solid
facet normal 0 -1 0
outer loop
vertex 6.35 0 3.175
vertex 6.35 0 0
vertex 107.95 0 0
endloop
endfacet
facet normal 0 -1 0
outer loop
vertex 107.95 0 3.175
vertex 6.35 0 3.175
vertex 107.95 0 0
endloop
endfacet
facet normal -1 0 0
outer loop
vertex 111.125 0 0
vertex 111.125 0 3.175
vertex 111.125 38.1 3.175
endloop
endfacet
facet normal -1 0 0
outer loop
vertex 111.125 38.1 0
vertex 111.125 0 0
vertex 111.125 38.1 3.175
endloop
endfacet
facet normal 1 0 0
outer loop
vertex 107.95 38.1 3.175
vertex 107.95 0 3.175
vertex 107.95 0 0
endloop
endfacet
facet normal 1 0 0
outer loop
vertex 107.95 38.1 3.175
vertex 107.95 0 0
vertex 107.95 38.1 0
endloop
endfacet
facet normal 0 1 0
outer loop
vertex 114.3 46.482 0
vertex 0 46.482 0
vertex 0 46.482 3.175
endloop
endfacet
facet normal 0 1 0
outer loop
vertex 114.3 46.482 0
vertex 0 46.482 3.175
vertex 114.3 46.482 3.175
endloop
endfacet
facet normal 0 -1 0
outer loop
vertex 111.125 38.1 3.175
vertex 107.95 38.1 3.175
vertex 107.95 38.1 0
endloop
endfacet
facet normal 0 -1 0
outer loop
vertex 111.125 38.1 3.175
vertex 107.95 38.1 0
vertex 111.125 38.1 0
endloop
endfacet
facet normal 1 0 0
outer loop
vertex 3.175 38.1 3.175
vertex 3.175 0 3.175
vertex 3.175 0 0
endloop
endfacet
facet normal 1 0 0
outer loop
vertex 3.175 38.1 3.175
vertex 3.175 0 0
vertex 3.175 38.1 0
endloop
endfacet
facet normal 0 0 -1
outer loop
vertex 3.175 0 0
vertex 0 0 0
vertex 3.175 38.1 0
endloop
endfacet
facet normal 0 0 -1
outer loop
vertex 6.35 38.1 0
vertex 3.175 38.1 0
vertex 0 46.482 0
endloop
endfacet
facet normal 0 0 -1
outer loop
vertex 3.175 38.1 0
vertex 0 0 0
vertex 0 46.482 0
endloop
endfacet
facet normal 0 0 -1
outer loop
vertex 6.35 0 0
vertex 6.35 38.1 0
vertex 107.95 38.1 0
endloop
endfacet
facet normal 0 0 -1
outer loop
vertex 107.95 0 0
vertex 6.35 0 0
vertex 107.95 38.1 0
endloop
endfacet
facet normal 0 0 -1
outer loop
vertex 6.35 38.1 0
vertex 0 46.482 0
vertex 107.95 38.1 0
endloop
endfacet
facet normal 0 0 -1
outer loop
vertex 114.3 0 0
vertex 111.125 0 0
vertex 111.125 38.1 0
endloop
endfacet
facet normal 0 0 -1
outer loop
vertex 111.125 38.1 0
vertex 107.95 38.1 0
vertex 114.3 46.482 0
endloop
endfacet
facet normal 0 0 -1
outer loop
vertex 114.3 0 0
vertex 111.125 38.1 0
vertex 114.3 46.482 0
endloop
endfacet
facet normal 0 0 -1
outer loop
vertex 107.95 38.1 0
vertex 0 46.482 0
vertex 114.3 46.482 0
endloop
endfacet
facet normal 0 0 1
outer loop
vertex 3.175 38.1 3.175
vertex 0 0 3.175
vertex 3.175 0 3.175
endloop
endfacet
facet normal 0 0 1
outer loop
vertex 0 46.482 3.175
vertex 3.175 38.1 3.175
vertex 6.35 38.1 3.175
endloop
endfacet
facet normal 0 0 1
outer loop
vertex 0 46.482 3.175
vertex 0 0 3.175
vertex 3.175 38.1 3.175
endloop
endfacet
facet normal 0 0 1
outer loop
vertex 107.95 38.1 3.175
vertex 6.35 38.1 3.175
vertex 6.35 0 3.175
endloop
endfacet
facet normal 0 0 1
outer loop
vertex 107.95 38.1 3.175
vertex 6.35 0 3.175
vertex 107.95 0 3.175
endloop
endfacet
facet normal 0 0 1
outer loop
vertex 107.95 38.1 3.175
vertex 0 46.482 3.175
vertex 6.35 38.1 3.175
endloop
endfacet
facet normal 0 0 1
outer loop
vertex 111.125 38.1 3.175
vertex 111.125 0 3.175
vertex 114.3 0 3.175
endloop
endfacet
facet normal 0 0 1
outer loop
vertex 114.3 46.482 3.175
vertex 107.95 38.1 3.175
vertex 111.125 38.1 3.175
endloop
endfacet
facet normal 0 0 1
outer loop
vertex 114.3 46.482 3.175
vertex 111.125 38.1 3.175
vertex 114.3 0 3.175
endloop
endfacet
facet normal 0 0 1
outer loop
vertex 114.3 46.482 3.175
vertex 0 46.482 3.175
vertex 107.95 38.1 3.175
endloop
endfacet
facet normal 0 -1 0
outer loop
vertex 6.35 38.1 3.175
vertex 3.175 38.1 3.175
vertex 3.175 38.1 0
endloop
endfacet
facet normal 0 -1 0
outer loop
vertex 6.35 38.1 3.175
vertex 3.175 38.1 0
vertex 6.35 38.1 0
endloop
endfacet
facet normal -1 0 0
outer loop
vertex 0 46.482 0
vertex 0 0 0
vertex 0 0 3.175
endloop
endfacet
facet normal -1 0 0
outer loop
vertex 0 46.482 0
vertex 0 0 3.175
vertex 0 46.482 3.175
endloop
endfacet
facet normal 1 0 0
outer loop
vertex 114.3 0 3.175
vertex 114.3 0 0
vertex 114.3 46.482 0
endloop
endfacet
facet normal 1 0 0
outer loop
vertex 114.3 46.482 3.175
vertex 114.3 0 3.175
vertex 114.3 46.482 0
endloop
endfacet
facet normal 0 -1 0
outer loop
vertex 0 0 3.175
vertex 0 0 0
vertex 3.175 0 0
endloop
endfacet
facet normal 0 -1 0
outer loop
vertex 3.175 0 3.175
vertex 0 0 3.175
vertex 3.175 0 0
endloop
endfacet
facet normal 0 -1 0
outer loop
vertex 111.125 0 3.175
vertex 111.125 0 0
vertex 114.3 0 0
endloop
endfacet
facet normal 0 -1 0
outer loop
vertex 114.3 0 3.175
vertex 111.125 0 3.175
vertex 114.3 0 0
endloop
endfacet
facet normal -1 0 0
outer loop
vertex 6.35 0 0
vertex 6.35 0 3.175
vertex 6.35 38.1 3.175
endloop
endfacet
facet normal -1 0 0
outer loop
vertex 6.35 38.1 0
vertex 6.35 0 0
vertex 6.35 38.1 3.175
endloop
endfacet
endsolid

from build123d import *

# Parameters (mm, degrees)
SKETCH1_W           = 114.3
SKETCH1_H           = 46.482
BOSS_EXTRUDE1_DEPTH = 3.175
SKETCH2_W           = 3.175
SKETCH2_H           = 38.1
CUT_EXTRUDE1_DEPTH  = 4.175


with BuildPart() as part:
    # Sketch1 → Boss-Extrude1 (new body)
    with BuildSketch(Plane.XY):
        with Locations((57.15, 23.241)):
            Rectangle(SKETCH1_W, SKETCH1_H)
    extrude(amount=BOSS_EXTRUDE1_DEPTH)

    # Sketch2 → Cut-Extrude1 (cut, through all)
    with BuildSketch(Plane.XY.offset(3.175)):
        with Locations((4.7625, 19.05)):
            Rectangle(SKETCH2_W, SKETCH2_H)
        with Locations((109.5375, 19.05)):
            Rectangle(SKETCH2_W, SKETCH2_H)
    extrude(amount=-CUT_EXTRUDE1_DEPTH, mode=Mode.SUBTRACT)


solid = part.part
